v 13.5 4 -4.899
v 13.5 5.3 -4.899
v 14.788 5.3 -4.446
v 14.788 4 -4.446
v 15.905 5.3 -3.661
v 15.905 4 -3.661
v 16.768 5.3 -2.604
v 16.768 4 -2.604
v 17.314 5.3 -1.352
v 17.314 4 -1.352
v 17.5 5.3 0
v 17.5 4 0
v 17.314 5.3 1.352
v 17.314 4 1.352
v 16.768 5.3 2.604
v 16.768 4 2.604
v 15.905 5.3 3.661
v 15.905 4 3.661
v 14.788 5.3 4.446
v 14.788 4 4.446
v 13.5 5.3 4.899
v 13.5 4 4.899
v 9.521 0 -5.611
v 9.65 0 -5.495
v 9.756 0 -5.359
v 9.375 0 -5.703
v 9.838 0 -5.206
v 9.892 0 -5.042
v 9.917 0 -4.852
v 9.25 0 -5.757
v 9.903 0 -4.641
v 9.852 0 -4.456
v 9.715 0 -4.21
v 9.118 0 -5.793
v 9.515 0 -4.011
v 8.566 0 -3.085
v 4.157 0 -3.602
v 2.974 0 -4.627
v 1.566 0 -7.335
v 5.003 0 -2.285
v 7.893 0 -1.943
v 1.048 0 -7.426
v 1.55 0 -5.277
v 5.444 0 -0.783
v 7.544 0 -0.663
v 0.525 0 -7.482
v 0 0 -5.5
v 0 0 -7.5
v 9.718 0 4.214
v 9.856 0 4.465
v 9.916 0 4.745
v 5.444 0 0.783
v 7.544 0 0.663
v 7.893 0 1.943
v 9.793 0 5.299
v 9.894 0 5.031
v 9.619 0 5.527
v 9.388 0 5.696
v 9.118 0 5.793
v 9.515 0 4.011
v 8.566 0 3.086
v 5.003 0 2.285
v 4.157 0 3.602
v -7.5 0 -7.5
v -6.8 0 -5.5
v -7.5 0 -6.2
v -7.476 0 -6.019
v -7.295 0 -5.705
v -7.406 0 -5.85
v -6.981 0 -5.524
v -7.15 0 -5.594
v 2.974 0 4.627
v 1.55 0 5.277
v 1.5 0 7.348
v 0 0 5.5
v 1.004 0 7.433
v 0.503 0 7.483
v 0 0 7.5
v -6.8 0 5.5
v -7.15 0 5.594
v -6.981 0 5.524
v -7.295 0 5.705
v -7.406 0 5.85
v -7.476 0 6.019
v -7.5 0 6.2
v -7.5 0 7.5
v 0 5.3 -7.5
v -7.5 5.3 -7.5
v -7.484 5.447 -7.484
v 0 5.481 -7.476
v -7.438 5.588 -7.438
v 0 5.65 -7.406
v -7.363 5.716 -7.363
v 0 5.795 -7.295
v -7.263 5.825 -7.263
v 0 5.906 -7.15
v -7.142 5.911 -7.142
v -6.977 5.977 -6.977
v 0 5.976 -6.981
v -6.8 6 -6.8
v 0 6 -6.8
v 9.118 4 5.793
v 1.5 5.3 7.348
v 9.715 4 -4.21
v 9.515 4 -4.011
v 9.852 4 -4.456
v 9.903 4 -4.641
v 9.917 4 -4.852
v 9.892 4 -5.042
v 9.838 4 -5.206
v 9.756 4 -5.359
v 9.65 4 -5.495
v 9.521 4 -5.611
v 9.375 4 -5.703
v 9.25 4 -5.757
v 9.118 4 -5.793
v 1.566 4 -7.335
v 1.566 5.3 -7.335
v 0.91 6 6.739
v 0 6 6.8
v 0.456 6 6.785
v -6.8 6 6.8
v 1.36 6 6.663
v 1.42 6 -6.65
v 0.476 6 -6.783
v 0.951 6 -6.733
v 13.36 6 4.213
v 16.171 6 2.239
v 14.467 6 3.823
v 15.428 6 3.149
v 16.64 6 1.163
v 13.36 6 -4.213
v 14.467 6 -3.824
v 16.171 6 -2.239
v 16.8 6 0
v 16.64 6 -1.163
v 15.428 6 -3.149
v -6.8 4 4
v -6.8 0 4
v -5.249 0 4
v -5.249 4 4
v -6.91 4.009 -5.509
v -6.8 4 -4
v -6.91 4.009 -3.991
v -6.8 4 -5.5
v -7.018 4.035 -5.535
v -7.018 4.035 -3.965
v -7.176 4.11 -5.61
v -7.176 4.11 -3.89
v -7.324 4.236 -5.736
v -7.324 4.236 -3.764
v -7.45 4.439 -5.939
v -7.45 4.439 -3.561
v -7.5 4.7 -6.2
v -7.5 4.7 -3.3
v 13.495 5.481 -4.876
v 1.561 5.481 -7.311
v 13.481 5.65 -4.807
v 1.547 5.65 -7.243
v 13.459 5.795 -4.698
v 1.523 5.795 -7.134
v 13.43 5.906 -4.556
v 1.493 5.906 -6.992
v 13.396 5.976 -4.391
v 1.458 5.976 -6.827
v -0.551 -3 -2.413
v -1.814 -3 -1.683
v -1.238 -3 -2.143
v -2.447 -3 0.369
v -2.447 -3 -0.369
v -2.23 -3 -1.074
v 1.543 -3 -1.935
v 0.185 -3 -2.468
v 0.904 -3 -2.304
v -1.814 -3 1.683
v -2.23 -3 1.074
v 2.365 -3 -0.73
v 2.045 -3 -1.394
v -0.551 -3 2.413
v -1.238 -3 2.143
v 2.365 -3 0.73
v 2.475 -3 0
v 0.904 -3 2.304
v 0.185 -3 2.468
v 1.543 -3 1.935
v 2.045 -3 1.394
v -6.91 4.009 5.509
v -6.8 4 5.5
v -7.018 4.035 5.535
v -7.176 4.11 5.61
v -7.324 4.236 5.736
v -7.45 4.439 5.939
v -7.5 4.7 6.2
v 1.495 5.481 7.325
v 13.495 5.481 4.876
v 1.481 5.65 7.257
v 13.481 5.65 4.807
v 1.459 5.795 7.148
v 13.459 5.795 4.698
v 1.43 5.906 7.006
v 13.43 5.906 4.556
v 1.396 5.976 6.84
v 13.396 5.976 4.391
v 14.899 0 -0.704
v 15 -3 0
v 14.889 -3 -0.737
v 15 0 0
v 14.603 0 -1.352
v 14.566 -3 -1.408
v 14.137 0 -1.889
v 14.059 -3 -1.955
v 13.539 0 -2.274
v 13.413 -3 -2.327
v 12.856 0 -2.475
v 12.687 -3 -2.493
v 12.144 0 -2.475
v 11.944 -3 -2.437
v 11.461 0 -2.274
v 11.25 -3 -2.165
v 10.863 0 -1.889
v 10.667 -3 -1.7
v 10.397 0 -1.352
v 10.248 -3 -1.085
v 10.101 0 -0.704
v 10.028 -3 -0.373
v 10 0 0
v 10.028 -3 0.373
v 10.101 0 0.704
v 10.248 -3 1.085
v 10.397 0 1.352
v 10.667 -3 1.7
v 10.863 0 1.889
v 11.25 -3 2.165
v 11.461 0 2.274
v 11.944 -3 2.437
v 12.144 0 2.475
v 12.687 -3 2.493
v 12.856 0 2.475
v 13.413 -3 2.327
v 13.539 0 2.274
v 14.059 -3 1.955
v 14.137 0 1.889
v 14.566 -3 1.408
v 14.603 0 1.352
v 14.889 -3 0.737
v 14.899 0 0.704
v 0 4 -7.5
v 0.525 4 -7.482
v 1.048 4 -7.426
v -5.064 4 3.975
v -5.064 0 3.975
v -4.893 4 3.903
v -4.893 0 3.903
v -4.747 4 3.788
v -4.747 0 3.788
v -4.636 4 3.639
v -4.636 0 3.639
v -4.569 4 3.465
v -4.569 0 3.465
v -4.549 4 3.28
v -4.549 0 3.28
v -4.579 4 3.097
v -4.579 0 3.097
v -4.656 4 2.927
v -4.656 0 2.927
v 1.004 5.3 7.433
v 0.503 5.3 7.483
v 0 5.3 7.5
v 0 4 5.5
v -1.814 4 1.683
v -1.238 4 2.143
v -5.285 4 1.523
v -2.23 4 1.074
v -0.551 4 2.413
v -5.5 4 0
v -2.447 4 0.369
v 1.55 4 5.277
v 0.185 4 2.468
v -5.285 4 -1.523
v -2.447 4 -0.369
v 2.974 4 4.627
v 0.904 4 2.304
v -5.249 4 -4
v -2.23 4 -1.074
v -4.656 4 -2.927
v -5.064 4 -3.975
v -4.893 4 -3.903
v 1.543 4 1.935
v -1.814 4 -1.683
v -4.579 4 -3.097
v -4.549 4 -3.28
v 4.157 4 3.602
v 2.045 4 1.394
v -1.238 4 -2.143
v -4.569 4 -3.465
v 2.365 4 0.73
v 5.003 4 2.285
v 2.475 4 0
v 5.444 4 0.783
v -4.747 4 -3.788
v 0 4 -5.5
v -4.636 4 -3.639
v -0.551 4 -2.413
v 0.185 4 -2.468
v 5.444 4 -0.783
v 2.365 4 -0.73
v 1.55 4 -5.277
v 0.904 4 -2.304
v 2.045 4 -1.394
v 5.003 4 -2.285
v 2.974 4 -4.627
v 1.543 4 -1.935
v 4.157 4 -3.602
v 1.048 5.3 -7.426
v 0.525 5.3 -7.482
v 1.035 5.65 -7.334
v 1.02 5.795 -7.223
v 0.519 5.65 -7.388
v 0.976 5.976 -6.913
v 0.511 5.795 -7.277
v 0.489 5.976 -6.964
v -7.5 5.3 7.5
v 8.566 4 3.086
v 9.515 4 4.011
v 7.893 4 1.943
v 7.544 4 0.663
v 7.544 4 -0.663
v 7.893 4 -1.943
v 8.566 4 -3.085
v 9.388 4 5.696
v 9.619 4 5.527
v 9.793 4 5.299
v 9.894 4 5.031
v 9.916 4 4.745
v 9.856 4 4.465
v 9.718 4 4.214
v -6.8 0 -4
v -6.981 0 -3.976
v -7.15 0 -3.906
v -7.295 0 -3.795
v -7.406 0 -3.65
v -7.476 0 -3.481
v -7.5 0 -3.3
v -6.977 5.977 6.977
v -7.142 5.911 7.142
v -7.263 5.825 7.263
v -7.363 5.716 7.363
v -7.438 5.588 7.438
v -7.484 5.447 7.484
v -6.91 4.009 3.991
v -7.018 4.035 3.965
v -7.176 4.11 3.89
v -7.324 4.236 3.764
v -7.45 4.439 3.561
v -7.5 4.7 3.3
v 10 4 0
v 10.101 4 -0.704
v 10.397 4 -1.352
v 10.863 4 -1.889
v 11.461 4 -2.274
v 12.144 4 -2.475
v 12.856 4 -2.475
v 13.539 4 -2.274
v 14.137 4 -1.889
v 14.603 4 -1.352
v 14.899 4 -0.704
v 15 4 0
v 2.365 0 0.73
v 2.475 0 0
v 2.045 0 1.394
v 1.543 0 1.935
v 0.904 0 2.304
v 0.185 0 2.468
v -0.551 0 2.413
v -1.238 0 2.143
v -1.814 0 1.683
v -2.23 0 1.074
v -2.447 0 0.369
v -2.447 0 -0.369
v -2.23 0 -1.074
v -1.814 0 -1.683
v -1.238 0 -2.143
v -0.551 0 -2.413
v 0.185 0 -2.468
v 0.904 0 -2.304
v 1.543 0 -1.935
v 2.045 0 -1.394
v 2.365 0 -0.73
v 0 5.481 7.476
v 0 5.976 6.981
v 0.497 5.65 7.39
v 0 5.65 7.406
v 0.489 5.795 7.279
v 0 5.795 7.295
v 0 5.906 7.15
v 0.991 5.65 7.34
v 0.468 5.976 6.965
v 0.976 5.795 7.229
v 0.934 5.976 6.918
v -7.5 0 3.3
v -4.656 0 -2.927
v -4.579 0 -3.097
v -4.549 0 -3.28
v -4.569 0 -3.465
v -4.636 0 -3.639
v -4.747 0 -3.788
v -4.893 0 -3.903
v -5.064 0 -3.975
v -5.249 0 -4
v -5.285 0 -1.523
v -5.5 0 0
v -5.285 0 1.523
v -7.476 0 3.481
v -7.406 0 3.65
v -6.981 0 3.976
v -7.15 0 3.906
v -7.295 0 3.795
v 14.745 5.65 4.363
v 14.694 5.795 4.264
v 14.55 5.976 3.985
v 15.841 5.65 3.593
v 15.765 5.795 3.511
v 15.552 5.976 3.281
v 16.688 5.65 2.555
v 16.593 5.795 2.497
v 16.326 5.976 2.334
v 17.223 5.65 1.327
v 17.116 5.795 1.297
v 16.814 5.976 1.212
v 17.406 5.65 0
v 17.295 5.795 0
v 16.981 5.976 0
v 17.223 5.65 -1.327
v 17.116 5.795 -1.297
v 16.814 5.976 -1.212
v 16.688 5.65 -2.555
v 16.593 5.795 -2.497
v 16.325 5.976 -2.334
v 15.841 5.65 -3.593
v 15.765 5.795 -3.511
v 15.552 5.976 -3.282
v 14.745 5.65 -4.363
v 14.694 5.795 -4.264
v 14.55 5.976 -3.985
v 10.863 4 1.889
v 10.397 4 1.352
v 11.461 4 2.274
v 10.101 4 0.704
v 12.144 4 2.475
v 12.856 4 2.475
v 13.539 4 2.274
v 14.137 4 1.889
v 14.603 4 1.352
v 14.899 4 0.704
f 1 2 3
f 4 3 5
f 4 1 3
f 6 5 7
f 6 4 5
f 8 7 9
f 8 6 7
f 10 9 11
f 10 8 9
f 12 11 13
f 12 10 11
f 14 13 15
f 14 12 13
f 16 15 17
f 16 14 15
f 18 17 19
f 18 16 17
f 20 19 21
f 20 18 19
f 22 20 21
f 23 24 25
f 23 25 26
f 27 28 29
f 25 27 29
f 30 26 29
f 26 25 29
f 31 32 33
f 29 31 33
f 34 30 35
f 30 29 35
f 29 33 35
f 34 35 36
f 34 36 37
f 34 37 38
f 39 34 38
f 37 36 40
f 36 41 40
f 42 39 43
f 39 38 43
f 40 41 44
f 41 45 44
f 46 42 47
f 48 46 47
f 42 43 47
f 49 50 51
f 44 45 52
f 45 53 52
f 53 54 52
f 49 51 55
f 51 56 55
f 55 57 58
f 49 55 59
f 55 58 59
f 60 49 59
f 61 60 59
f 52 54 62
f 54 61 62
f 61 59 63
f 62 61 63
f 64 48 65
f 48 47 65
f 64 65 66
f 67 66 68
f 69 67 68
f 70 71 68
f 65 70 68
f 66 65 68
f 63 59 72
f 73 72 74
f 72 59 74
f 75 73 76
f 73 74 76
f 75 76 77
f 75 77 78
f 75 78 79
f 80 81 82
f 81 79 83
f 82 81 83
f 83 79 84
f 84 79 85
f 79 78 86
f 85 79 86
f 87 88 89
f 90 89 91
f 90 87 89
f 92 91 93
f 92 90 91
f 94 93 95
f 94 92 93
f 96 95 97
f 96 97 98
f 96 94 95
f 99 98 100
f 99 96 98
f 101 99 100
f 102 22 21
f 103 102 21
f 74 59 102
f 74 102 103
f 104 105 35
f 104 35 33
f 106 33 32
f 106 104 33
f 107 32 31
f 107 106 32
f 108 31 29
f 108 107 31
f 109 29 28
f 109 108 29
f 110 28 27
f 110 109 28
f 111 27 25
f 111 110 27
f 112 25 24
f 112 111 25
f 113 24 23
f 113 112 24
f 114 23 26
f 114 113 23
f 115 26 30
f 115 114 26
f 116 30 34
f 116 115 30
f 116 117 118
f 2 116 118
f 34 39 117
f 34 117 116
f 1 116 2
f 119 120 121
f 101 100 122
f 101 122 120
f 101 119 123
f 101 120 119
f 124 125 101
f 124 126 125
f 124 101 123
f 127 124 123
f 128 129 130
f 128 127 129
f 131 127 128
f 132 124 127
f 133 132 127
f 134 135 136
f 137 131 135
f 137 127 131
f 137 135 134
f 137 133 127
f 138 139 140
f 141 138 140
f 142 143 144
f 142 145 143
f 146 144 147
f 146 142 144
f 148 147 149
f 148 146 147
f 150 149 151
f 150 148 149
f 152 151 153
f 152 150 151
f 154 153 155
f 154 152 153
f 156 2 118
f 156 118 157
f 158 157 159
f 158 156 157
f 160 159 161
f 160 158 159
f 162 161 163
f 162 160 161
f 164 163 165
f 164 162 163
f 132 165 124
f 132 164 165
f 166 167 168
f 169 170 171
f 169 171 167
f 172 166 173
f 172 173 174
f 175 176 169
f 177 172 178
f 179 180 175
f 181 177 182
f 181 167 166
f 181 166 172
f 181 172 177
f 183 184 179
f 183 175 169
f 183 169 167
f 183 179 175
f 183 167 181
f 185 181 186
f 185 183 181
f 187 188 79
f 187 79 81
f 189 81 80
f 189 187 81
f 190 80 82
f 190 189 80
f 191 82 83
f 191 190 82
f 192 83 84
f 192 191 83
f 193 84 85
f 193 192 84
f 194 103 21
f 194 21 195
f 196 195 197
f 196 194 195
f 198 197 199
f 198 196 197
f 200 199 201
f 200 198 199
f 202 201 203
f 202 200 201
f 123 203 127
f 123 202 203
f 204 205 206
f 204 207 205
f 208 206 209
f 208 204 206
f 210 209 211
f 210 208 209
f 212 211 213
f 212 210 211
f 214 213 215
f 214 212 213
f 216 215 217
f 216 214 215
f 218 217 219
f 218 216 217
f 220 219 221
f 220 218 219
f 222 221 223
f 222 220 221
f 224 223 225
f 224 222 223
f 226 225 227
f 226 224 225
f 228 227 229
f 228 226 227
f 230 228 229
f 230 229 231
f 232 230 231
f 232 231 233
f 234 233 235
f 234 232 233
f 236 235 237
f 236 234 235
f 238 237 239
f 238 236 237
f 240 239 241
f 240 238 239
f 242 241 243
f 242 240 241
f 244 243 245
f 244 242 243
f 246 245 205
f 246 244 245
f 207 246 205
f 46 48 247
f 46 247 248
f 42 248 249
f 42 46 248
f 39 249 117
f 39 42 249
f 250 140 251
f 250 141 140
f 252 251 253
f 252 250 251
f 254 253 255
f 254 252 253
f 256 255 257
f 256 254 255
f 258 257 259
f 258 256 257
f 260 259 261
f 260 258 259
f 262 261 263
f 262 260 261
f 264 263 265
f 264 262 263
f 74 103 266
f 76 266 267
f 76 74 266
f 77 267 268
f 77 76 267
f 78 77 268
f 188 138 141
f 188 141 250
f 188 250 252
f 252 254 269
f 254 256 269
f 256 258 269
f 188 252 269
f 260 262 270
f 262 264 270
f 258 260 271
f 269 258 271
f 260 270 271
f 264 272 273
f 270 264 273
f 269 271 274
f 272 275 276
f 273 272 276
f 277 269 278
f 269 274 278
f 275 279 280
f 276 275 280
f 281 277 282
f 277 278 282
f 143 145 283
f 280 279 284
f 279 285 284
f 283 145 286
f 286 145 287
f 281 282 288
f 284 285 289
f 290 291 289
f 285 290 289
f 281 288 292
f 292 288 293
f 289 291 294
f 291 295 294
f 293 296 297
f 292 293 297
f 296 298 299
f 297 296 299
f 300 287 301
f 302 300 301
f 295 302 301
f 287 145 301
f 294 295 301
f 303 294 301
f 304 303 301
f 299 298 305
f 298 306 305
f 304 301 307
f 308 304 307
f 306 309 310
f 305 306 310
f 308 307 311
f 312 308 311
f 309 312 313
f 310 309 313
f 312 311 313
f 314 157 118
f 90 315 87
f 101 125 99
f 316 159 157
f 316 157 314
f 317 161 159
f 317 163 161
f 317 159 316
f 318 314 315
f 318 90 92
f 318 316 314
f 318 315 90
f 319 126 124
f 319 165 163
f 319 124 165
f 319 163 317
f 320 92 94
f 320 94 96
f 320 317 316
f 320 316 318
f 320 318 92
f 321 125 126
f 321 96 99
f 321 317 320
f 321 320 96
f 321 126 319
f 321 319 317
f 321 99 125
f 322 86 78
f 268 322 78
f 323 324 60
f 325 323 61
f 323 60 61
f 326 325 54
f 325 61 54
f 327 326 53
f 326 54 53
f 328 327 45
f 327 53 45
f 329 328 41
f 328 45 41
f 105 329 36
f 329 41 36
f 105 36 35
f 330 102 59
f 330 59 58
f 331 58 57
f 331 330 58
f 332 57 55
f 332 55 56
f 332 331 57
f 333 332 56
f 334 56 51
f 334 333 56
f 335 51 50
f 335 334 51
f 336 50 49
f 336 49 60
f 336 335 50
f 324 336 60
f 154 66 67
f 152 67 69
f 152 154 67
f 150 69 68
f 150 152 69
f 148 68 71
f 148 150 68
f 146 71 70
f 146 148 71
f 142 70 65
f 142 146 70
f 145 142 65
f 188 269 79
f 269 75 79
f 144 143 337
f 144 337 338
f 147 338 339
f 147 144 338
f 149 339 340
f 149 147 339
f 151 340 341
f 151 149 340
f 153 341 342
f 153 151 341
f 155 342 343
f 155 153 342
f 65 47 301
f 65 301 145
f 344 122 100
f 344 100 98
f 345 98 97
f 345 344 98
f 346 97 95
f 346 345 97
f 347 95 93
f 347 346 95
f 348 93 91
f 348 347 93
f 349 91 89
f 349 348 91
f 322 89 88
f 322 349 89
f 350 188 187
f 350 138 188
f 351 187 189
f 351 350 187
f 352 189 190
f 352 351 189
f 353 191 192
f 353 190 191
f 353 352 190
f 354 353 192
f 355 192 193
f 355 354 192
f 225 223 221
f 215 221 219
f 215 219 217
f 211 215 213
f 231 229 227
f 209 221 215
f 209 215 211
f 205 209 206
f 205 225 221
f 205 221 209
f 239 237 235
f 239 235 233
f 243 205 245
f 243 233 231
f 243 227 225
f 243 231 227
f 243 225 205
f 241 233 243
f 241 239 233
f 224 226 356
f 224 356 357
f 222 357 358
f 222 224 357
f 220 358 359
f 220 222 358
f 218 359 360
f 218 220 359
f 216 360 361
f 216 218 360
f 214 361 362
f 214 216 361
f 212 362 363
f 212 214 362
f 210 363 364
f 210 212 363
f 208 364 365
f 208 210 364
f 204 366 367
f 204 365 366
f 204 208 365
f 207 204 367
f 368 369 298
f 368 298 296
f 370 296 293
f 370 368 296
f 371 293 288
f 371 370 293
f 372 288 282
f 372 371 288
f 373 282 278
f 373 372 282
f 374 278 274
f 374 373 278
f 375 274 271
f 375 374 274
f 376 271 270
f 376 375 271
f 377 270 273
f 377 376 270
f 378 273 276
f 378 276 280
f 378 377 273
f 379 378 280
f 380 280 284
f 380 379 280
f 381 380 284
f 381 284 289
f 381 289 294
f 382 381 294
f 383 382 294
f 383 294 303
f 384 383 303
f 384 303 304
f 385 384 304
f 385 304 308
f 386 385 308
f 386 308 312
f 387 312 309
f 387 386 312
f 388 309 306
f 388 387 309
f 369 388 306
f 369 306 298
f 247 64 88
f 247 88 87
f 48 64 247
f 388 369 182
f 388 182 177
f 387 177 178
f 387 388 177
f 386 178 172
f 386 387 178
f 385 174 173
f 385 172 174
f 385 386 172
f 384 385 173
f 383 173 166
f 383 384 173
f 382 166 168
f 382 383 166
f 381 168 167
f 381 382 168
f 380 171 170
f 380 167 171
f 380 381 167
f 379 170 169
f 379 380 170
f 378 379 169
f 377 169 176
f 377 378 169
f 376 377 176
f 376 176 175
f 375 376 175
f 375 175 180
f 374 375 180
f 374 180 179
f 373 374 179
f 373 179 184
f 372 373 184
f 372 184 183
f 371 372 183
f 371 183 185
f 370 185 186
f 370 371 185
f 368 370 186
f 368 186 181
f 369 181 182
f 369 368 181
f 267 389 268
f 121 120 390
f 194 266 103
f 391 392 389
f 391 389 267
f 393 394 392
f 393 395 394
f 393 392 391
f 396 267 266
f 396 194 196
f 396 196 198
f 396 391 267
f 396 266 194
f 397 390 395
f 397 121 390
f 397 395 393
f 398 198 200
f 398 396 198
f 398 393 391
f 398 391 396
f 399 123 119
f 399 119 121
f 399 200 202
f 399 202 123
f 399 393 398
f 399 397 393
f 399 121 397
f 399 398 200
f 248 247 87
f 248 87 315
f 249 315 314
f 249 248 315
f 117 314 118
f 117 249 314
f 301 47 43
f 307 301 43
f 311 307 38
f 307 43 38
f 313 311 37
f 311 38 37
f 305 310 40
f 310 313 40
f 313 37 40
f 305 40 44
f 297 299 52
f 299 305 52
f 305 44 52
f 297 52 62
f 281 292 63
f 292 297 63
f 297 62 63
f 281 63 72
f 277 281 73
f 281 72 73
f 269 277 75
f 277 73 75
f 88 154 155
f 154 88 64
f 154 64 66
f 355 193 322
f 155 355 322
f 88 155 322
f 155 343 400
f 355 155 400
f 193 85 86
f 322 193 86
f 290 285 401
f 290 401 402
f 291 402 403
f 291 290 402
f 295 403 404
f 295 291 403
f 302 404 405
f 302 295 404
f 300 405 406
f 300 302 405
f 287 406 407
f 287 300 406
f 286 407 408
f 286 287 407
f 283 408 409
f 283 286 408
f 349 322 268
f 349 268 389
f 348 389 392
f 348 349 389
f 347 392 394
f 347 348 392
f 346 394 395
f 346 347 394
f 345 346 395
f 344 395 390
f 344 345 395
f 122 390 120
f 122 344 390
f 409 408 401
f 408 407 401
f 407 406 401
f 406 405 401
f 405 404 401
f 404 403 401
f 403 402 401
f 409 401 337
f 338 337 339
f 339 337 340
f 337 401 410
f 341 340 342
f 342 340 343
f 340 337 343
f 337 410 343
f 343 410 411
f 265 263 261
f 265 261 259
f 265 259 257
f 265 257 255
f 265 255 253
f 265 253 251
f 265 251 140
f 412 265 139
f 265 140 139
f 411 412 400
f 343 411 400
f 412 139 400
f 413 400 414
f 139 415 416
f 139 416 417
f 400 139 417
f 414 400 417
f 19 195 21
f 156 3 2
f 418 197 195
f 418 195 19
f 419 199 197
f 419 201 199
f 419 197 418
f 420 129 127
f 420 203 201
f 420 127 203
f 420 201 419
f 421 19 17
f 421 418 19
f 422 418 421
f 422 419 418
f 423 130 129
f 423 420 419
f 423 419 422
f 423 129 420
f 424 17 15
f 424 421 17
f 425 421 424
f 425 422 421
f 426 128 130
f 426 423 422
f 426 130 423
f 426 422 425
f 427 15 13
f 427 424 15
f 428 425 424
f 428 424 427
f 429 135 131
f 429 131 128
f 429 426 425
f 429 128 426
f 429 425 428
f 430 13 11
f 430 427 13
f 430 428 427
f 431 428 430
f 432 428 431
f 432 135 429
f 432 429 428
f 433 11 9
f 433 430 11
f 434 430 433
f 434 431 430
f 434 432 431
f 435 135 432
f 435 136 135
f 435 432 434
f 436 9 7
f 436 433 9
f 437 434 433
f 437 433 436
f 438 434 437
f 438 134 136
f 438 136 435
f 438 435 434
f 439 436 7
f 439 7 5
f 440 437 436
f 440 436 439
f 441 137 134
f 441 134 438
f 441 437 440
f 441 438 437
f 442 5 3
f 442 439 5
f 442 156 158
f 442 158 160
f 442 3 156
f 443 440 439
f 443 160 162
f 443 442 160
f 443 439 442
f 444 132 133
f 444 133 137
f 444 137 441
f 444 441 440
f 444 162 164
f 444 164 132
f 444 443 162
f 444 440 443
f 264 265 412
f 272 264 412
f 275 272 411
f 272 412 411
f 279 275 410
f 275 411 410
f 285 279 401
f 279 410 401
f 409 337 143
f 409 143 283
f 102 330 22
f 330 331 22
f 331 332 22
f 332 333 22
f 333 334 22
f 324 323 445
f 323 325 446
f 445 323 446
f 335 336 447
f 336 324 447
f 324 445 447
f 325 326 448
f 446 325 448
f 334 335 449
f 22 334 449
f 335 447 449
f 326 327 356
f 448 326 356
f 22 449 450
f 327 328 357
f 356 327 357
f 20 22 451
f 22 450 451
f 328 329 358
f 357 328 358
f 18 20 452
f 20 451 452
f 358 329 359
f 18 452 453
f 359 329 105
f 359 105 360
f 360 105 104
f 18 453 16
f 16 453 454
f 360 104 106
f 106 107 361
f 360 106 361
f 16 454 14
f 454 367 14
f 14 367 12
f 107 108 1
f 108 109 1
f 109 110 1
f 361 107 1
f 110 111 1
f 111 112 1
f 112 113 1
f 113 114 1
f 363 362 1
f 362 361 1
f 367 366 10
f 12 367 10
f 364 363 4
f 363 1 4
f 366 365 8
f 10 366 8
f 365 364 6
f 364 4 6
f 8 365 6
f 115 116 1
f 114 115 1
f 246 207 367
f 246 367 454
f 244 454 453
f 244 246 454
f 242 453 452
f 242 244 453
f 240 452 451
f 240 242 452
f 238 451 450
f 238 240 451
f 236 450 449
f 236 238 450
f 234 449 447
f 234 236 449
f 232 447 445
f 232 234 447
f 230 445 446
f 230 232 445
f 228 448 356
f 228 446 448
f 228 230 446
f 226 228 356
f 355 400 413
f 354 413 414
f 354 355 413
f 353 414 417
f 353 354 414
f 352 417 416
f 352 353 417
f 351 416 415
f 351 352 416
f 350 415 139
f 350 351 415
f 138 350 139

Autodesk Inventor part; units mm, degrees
ref_plane "YZ Plane" through (0, 0, 0) normal (1, 0, 0) x (0, 1, 0)
ref_plane "XZ Plane" through (0, 0, 0) normal (0, 1, 0) x (-1, 0, 0)
ref_plane "XY Plane" through (0, 0, 0) normal (0, 0, 1) x (1, 0, 0)
sketch "Эскиз3" plane through (0, 0, 0) normal (0, 1, 0) x (-1, 0, 0)
  circle A0 centre (0, 0) radius 5.5
  circle A1 centre (0, 0) radius 7.5
  line L0 (7.5, 0) -> (7.5, 7.5)
  line L1 (7.5, 7.5) -> (0, 7.5)
  line L2 (0, 7.5) -> (7.5, 7.5)
  line L3 (7.5, 7.5) -> (7.5, -7.5)
  line L4 (7.5, -7.5) -> (0, -7.5)
  line L5 (0, -7.5) -> (0, 7.5)
  line L6 (-7.5, 0) -> (-12.5, 0)
  circle A2 centre (-12.5, 0) radius 2.5
  circle A3 centre (-12.5, 0) radius 5
  line L7 (-1.5661, -7.3347) -> (-13.4999, -4.899)
  line L8 (-13.5, 4.899) -> (-1.5, 7.3485)
  line L9 (0, 5.5) -> (7.5, 5.5)
  line L10 (0, -5.5) -> (7.5, -5.5)
  line L11 (7.5, -5.5) -> (7.5, -4)
  line L12 (7.5, -4) -> (3.7749, -4)
  line L13 (7.5, 5.5) -> (7.5, 4)
  line L14 (7.5, 4) -> (3.7749, 4)
  circle A4 centre (0, 0) radius 2.45
  dimension "d9" = 11
  dimension "d10" = 15
  dimension "d11" = 5
  dimension "d12" = 5
  dimension "d13" = 1.5
  dimension "d14" = 1.5
  dimension "d17" = 4.9
extrude "Выдавливание3" add sketch "Эскиз3" along normal blind 4 contours A0 L14 A1 L12 | A0 L5 A1 | L5 A1 L9 | L14 L0 A1 | L10 A1 L5 | A1 L3 L12 | L1 L0 L9 A1 | A4 L5 | L5 A4 | A1 L10 L3 L4 | A1 A3 L8 | L7 A3 A1 | A2
sketch "Эскиз4" plane through (0, 4, 0) normal (0, 1, 0) x (1, 0, 0)
  circle A0 centre (12.5, 0) radius 2.5 projected
  line L0 (1.5, -7.3485) -> (13.5, -4.899) projected
  circle A1 centre (12.5, 0) radius 5
  line L1 (-7.5, 7.5) -> (-7.5, 5.5) projected
  line L2 (-7.5, -7.5) -> (0, -7.5) projected
  line L3 (-7.5, 7.5) -> (-7.5, -7.5)
  line L4 (-7.5, -7.5) -> (0, -7.5)
  line L5 (1.5, -7.3485) -> (13.5, -4.899)
  arc A2 (1.5661, 7.3347) -> (0, 7.5) centre (0, 0) ccw projected
  line L6 (13.4999, 4.899) -> (1.5661, 7.3347) projected
  line L7 (1.5661, 7.3347) -> (13.4999, 4.899)
  line L8 (-7.5, 7.5) -> (0, 7.5)
  line L9 (0, 7.5) -> (-7.5, 7.5) projected
  circle A3 centre (0, 0) radius 7.5
  point P0 (0, 7.5)
extrude "Выдавливание4" add sketch "Эскиз4" along normal blind 2 contours A0 | A3 A1 L0 | A3 A2 | A1 | L2 L3 A3 | A3 L6 A1 | L3 L1 L8 A3
fillet "Сопряжение1" radius 1 2 edges at (13.5, 2, 4.899) (13.4999, 2, -4.899)
sketch "Эскиз5" plane through (0, 0, 0) normal (0, -1, 0) x (1, 0, 0)
  circle A0 centre (0, 0) radius 2.475
  circle A1 centre (12.5, 0) radius 2.5 projected
  circle A2 centre (12.5, 0) radius 2.5
  dimension "d25" = 4.95
extrude "Выдавливание5" add sketch "Эскиз5" along normal blind 3 and the other way blind 5
fillet "Сопряжение3" radius 0.7 16 edges at (17.5, 6, -0.0001) (7.533, 6, -6.1168) (0.7538, 6, 7.462) (-3.75, 6, 7.5) (7.5, 6, 6.1237) (-7.5, 6, 0) (0.7874, 6, -7.4586) (-3.75, 6, -7.5) (-3.7749, 2, 4) (-3.7749, 2, -4) (-7.5, 2, -4) (-7.5, 2, -5.5) (-7.5, 4, -4.75) (-7.5, 2, 5.5) (-7.5, 2, 4) (-7.5, 4, 4.75)
properties part number "block_01"
